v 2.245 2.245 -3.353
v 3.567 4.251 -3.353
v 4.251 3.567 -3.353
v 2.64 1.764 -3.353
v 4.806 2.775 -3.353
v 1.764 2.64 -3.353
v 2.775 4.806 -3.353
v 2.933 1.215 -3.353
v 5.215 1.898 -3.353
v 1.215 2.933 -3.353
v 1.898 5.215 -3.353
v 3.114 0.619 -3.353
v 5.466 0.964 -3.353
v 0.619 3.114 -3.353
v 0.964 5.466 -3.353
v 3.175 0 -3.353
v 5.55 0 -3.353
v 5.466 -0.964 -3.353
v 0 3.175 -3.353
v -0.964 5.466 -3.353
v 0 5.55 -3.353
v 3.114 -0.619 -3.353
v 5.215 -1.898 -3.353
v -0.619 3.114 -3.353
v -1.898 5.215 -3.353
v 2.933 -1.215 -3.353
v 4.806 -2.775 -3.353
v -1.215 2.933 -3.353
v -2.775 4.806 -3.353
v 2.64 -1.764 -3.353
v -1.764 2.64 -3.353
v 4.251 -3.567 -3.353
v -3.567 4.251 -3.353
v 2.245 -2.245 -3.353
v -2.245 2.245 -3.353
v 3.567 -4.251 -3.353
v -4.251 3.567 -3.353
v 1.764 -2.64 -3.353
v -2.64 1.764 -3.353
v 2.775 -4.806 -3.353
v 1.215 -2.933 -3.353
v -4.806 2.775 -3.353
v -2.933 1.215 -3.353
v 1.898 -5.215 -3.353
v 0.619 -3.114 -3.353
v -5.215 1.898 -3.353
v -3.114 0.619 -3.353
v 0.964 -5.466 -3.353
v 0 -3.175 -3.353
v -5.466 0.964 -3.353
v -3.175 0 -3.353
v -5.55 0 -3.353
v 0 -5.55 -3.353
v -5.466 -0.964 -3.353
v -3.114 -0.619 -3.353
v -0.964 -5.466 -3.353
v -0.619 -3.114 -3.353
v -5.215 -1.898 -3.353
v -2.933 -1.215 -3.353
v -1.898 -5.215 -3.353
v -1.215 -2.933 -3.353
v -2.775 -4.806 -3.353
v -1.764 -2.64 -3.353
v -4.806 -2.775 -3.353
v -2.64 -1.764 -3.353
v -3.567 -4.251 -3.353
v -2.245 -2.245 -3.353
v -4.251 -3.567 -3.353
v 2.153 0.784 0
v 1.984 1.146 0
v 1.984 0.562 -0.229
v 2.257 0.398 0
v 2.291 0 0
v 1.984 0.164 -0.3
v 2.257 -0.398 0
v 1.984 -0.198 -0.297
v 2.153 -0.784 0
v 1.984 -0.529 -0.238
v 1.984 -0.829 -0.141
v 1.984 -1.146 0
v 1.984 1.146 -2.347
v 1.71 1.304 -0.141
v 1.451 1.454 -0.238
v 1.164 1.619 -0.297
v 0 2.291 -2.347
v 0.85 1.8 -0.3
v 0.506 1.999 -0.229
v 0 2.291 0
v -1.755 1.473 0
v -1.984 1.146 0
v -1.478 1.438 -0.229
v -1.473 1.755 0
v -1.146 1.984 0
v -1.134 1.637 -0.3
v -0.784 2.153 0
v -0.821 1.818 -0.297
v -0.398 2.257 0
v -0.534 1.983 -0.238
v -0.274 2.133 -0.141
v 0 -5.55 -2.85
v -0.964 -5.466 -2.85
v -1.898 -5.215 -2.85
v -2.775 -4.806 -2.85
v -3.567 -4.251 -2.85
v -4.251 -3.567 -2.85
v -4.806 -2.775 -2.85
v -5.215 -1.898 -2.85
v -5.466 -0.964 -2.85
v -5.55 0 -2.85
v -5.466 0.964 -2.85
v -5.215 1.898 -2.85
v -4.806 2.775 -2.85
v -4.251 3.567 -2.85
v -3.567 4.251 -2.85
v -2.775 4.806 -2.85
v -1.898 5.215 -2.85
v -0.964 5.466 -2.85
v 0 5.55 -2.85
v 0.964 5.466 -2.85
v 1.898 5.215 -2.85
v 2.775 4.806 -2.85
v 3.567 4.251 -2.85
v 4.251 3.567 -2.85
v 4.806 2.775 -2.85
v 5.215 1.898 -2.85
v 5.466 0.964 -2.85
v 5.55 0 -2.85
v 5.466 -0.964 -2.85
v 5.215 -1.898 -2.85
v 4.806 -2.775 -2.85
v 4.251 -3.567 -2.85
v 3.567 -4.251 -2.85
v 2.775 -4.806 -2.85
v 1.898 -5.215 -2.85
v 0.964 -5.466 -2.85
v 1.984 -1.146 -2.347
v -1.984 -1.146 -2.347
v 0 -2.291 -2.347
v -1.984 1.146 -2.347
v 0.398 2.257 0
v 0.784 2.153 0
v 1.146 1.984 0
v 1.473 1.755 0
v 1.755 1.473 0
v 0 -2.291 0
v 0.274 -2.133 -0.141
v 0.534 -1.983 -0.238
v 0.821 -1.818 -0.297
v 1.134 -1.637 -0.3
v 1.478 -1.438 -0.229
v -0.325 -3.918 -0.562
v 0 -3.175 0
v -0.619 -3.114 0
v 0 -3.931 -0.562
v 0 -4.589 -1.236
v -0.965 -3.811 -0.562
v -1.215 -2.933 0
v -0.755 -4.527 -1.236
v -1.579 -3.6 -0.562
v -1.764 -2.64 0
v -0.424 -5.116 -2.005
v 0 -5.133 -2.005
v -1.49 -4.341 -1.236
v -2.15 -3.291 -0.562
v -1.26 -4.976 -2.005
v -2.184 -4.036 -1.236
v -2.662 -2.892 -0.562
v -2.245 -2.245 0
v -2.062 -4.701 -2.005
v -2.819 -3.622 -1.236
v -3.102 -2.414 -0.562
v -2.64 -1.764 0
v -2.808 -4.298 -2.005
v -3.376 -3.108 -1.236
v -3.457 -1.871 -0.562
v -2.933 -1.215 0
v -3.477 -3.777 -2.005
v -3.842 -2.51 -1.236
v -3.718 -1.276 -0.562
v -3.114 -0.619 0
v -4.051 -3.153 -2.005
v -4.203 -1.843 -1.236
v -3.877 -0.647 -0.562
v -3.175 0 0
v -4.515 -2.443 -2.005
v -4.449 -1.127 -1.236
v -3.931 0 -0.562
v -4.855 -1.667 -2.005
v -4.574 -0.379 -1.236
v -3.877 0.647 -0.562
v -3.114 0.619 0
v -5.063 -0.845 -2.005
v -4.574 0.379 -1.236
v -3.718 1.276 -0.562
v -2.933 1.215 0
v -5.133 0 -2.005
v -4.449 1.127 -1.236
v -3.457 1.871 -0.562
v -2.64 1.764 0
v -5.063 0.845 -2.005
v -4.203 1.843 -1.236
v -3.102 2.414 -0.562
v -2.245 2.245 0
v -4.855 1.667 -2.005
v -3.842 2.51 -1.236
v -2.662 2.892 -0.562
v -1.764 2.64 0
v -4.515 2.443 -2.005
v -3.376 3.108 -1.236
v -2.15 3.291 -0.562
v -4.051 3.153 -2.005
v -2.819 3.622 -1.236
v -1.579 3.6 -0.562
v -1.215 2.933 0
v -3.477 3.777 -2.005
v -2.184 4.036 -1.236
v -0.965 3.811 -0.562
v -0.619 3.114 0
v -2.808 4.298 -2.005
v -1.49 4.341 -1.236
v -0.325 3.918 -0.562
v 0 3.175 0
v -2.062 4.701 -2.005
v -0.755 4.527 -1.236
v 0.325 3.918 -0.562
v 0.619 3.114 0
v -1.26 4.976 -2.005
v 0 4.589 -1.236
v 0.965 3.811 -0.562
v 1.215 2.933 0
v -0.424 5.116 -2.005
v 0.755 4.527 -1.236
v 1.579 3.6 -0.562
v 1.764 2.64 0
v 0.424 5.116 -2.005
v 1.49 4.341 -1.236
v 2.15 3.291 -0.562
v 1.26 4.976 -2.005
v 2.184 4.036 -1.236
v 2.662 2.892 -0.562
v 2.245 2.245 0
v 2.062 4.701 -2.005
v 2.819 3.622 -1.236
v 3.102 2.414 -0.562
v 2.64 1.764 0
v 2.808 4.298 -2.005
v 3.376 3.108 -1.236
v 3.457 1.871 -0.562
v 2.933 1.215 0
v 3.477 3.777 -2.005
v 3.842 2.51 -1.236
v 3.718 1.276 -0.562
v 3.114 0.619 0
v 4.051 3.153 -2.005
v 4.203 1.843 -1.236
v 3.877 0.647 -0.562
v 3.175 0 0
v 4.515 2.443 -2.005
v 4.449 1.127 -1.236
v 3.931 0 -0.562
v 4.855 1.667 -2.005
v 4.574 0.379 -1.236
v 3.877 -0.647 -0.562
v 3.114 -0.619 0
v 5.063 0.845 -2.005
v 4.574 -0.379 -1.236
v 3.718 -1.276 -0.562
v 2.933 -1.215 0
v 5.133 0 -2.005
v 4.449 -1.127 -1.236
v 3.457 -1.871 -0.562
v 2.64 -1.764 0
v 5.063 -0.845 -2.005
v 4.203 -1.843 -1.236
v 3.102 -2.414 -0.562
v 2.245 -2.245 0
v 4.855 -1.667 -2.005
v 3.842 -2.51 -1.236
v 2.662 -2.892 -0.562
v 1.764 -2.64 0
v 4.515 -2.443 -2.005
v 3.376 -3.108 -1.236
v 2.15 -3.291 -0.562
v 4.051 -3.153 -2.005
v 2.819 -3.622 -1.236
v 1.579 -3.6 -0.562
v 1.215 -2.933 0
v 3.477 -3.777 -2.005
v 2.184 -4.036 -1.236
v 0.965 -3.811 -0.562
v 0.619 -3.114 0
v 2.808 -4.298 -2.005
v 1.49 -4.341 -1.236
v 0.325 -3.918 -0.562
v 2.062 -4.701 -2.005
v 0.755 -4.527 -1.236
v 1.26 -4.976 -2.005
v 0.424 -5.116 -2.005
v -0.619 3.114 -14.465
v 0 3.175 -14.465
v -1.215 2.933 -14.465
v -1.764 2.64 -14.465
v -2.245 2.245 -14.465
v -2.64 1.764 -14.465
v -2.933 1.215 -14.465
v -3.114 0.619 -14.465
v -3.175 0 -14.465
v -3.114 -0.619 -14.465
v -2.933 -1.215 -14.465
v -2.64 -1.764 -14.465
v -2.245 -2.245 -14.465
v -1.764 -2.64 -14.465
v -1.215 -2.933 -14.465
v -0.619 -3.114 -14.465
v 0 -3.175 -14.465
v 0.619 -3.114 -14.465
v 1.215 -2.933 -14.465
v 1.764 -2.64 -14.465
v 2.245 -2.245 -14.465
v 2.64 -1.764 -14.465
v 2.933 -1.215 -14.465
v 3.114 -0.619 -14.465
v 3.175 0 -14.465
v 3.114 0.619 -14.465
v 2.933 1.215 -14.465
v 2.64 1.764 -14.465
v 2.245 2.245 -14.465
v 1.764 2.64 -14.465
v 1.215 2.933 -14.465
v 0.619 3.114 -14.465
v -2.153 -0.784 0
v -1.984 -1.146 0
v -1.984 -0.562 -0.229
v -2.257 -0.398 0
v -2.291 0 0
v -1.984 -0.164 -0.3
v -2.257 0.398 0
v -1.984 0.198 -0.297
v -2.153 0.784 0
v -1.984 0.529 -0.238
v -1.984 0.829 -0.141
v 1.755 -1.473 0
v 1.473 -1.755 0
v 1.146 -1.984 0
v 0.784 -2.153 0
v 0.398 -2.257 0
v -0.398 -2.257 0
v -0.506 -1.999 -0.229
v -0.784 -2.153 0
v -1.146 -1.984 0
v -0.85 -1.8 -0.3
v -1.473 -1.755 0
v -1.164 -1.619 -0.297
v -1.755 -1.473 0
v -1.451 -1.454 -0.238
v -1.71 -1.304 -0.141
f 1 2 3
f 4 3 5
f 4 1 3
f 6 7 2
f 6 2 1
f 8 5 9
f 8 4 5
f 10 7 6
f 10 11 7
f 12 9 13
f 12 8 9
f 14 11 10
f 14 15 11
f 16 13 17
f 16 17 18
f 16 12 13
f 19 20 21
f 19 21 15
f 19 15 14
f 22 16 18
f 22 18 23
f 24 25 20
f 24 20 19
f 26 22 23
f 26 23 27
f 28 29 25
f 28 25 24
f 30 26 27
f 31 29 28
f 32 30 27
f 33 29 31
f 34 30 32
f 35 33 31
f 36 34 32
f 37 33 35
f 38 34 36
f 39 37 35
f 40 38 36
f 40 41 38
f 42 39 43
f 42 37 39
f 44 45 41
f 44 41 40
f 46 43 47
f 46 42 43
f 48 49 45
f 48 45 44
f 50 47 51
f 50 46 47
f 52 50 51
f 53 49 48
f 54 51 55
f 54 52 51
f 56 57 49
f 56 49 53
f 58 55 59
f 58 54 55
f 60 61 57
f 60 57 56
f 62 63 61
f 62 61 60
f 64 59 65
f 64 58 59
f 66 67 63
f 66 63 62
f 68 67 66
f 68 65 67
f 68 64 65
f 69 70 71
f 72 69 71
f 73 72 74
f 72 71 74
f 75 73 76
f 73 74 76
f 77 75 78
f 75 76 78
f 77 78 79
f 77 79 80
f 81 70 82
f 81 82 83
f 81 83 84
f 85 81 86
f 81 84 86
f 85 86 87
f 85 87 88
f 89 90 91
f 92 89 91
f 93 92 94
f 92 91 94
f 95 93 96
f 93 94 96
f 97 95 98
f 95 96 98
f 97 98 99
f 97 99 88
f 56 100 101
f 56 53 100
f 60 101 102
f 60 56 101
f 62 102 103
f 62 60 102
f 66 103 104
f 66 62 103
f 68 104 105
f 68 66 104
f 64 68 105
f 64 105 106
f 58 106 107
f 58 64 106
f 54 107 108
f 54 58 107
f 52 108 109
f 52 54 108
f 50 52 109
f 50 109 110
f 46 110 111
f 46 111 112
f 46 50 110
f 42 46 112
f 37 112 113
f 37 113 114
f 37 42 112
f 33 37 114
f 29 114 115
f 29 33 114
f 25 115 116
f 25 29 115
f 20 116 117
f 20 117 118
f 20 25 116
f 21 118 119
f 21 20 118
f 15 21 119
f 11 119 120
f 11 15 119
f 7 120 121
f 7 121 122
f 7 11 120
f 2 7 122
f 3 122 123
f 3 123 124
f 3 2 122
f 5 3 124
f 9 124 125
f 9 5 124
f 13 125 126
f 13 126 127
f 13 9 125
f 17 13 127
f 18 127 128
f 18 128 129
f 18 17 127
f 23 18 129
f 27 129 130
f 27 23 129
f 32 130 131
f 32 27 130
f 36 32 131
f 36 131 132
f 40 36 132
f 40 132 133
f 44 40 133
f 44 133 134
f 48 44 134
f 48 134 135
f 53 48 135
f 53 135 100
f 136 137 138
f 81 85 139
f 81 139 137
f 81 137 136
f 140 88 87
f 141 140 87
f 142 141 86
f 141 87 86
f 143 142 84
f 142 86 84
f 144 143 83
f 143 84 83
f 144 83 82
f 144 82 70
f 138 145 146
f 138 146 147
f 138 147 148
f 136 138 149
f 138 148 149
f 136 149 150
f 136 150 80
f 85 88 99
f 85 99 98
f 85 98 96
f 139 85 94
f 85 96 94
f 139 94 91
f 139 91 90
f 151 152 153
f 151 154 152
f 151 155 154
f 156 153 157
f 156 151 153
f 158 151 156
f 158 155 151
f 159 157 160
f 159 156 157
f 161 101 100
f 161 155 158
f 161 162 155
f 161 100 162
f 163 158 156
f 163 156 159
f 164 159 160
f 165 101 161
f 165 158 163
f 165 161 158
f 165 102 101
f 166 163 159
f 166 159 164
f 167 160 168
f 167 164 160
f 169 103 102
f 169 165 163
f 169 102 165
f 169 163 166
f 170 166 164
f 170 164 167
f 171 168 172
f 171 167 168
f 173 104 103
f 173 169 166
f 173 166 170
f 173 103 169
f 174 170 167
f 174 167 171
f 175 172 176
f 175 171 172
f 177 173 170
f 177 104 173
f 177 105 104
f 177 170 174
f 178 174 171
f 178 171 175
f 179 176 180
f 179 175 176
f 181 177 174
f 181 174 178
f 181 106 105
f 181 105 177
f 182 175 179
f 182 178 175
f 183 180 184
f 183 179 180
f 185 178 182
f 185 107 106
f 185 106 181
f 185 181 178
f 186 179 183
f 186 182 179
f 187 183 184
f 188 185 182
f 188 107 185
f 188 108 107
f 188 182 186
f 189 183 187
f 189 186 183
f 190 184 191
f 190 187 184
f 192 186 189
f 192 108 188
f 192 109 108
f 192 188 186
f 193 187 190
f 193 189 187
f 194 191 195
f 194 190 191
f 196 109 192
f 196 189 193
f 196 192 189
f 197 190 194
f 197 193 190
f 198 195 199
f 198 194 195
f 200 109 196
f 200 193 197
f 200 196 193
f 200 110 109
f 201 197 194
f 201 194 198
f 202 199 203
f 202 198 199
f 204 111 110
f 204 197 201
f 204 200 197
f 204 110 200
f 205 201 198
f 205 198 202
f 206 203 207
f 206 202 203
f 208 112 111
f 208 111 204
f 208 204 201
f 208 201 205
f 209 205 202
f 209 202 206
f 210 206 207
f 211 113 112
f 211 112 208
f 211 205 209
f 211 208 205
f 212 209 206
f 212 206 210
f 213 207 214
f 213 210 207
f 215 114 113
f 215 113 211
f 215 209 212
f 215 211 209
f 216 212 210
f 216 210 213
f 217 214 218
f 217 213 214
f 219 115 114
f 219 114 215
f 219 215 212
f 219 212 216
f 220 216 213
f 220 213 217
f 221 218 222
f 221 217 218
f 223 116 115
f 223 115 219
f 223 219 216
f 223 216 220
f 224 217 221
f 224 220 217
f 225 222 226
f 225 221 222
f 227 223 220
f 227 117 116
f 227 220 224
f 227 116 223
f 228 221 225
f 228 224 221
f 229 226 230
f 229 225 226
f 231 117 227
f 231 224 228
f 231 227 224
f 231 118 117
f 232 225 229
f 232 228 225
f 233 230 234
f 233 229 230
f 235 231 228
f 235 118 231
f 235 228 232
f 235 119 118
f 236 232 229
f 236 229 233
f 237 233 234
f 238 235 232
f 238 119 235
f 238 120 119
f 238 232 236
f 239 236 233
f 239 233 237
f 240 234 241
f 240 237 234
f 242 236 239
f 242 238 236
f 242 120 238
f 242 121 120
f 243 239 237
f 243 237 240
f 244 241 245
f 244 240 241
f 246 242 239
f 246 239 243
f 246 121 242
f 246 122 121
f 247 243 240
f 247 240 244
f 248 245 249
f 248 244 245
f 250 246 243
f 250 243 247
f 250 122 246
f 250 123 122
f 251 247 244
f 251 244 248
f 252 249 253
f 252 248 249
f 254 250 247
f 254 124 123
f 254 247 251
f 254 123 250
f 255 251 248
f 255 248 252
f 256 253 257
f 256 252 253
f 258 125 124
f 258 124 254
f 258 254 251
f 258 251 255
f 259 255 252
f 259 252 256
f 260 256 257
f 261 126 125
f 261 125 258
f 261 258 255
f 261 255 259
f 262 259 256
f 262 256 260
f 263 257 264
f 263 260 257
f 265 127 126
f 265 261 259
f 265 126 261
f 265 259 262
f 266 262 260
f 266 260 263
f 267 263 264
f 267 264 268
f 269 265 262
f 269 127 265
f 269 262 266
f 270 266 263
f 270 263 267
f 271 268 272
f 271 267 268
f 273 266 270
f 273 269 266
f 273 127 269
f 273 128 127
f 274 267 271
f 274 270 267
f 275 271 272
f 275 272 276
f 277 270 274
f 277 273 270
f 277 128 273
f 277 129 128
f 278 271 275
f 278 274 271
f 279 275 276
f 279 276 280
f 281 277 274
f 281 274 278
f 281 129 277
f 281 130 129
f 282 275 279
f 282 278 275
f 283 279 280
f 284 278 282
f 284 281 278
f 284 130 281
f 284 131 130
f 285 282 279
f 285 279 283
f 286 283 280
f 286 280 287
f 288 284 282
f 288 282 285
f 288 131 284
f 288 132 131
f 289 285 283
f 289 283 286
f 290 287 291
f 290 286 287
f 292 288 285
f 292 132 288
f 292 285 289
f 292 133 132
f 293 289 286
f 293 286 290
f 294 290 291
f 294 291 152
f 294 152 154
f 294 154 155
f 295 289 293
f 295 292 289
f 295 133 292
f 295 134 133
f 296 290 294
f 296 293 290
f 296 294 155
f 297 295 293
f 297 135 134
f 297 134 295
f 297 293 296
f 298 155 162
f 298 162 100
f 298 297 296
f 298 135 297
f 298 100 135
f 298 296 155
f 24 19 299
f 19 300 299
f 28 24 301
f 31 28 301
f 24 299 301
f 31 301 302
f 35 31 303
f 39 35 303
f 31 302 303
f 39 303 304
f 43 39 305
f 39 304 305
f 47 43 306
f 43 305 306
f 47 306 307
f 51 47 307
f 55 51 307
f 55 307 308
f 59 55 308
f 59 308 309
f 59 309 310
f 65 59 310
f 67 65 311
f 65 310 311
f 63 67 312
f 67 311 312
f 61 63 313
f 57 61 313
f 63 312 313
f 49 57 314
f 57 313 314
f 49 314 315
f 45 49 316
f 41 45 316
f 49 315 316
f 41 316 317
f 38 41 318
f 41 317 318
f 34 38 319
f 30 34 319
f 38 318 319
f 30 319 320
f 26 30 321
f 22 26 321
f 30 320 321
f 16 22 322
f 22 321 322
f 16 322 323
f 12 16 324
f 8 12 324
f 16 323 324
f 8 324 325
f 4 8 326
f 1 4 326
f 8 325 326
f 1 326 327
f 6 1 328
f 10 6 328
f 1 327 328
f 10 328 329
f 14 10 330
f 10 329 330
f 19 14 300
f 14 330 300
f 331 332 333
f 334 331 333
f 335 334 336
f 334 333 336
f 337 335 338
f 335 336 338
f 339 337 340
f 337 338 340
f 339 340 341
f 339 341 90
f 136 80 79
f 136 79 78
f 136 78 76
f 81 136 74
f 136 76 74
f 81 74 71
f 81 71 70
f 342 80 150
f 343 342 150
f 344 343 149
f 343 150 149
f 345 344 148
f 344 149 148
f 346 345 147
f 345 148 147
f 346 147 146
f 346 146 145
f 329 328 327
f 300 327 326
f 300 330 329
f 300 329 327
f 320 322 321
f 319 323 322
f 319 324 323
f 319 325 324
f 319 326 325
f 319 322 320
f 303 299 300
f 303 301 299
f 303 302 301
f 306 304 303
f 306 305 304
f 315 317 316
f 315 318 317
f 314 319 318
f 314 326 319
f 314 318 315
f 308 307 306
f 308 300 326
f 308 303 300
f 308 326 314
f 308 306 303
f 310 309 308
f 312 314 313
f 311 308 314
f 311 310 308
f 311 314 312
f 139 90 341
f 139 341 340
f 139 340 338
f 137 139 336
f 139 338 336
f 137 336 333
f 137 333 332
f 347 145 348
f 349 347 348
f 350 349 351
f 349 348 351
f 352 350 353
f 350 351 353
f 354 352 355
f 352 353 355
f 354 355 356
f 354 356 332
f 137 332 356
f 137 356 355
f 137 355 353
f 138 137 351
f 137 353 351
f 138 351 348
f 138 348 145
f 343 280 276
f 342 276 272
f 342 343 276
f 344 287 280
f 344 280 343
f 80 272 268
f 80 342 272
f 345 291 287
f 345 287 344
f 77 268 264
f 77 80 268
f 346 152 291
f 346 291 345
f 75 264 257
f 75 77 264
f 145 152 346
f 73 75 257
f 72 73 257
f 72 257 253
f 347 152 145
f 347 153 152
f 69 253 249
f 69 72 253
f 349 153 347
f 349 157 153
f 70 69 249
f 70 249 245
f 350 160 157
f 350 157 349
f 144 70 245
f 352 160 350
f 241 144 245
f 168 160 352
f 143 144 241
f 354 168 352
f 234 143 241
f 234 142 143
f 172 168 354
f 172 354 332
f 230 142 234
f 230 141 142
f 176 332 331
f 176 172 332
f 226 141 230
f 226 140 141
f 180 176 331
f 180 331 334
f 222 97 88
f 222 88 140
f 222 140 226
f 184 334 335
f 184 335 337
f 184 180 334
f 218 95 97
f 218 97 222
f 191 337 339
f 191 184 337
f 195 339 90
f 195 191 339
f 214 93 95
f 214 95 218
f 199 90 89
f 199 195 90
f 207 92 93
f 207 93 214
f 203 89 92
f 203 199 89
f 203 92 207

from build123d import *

# Parameters (mm, degrees)
SKETCH1_W          = 11.1125
SKETCH1_H          = 3.175
CUT_EXTRUDE2_DEPTH = 2.34696


with BuildPart() as part:
    # Sketch1 → Revolve1 (revolve)
    with BuildSketch(Plane(origin=(0, 0, 0), x_dir=(0, 0, -1), z_dir=(1, 0, 0))):
        with Locations((8.90905, 1.5875)):
            Rectangle(SKETCH1_W, SKETCH1_H)
    revolve(axis=Axis((0, 0, -14.4653), (0, 0, 1)))

    # Sketch7 → Revolve2 (revolve)
    with BuildSketch(Plane(origin=(0, 0, 0), x_dir=(0, 0, -1), z_dir=(1, 0, 0)), mode=Mode.PRIVATE) as revolve2_sk:
        with BuildLine():
            Line((2.84988, 5.5499), (3.3528, 5.5499))
            Line((3.3528, 5.5499), (3.3528, 0))
            Line((3.3528, 0), (0, 0))
            Line((0, 0), (0, 3.175))
            ThreePointArc((0, 3.175), (1.235921075, 4.58927271), (2.84988, 5.5499))
        make_face()
    revolve(revolve2_sk.sketch.rotate(Axis((0, 0, 0), (0, 0, -1)), 180), axis=Axis((0, 0, 0), (0, 0, -1)))

    # Sketch5 → Cut-Extrude2 (cut)
    with BuildSketch(Plane.XY):
        Polygon((1.984375, -1.14567944), (1.984375, 1.14567944), (0, 2.291358881), (-1.984375, 1.14567944), (-1.984375, -1.14567944), (0, -2.291358881), align=None)
    extrude(amount=-CUT_EXTRUDE2_DEPTH, mode=Mode.SUBTRACT)

    # Cut-Extrude3 cone 1 section (through the dimple's axis) → Cut-Extrude3 (revolve, cut)
    with BuildSketch(Plane(origin=(0, 0, 0), x_dir=(0, -1, 0), z_dir=(1, 0, 0))):
        Polygon((0, 0), (2.291358881, 0), (0, 2.291358881), align=None)
    revolve(axis=Axis((0, 0, 0), (0, 0, -1)), mode=Mode.SUBTRACT)


solid = part.part
